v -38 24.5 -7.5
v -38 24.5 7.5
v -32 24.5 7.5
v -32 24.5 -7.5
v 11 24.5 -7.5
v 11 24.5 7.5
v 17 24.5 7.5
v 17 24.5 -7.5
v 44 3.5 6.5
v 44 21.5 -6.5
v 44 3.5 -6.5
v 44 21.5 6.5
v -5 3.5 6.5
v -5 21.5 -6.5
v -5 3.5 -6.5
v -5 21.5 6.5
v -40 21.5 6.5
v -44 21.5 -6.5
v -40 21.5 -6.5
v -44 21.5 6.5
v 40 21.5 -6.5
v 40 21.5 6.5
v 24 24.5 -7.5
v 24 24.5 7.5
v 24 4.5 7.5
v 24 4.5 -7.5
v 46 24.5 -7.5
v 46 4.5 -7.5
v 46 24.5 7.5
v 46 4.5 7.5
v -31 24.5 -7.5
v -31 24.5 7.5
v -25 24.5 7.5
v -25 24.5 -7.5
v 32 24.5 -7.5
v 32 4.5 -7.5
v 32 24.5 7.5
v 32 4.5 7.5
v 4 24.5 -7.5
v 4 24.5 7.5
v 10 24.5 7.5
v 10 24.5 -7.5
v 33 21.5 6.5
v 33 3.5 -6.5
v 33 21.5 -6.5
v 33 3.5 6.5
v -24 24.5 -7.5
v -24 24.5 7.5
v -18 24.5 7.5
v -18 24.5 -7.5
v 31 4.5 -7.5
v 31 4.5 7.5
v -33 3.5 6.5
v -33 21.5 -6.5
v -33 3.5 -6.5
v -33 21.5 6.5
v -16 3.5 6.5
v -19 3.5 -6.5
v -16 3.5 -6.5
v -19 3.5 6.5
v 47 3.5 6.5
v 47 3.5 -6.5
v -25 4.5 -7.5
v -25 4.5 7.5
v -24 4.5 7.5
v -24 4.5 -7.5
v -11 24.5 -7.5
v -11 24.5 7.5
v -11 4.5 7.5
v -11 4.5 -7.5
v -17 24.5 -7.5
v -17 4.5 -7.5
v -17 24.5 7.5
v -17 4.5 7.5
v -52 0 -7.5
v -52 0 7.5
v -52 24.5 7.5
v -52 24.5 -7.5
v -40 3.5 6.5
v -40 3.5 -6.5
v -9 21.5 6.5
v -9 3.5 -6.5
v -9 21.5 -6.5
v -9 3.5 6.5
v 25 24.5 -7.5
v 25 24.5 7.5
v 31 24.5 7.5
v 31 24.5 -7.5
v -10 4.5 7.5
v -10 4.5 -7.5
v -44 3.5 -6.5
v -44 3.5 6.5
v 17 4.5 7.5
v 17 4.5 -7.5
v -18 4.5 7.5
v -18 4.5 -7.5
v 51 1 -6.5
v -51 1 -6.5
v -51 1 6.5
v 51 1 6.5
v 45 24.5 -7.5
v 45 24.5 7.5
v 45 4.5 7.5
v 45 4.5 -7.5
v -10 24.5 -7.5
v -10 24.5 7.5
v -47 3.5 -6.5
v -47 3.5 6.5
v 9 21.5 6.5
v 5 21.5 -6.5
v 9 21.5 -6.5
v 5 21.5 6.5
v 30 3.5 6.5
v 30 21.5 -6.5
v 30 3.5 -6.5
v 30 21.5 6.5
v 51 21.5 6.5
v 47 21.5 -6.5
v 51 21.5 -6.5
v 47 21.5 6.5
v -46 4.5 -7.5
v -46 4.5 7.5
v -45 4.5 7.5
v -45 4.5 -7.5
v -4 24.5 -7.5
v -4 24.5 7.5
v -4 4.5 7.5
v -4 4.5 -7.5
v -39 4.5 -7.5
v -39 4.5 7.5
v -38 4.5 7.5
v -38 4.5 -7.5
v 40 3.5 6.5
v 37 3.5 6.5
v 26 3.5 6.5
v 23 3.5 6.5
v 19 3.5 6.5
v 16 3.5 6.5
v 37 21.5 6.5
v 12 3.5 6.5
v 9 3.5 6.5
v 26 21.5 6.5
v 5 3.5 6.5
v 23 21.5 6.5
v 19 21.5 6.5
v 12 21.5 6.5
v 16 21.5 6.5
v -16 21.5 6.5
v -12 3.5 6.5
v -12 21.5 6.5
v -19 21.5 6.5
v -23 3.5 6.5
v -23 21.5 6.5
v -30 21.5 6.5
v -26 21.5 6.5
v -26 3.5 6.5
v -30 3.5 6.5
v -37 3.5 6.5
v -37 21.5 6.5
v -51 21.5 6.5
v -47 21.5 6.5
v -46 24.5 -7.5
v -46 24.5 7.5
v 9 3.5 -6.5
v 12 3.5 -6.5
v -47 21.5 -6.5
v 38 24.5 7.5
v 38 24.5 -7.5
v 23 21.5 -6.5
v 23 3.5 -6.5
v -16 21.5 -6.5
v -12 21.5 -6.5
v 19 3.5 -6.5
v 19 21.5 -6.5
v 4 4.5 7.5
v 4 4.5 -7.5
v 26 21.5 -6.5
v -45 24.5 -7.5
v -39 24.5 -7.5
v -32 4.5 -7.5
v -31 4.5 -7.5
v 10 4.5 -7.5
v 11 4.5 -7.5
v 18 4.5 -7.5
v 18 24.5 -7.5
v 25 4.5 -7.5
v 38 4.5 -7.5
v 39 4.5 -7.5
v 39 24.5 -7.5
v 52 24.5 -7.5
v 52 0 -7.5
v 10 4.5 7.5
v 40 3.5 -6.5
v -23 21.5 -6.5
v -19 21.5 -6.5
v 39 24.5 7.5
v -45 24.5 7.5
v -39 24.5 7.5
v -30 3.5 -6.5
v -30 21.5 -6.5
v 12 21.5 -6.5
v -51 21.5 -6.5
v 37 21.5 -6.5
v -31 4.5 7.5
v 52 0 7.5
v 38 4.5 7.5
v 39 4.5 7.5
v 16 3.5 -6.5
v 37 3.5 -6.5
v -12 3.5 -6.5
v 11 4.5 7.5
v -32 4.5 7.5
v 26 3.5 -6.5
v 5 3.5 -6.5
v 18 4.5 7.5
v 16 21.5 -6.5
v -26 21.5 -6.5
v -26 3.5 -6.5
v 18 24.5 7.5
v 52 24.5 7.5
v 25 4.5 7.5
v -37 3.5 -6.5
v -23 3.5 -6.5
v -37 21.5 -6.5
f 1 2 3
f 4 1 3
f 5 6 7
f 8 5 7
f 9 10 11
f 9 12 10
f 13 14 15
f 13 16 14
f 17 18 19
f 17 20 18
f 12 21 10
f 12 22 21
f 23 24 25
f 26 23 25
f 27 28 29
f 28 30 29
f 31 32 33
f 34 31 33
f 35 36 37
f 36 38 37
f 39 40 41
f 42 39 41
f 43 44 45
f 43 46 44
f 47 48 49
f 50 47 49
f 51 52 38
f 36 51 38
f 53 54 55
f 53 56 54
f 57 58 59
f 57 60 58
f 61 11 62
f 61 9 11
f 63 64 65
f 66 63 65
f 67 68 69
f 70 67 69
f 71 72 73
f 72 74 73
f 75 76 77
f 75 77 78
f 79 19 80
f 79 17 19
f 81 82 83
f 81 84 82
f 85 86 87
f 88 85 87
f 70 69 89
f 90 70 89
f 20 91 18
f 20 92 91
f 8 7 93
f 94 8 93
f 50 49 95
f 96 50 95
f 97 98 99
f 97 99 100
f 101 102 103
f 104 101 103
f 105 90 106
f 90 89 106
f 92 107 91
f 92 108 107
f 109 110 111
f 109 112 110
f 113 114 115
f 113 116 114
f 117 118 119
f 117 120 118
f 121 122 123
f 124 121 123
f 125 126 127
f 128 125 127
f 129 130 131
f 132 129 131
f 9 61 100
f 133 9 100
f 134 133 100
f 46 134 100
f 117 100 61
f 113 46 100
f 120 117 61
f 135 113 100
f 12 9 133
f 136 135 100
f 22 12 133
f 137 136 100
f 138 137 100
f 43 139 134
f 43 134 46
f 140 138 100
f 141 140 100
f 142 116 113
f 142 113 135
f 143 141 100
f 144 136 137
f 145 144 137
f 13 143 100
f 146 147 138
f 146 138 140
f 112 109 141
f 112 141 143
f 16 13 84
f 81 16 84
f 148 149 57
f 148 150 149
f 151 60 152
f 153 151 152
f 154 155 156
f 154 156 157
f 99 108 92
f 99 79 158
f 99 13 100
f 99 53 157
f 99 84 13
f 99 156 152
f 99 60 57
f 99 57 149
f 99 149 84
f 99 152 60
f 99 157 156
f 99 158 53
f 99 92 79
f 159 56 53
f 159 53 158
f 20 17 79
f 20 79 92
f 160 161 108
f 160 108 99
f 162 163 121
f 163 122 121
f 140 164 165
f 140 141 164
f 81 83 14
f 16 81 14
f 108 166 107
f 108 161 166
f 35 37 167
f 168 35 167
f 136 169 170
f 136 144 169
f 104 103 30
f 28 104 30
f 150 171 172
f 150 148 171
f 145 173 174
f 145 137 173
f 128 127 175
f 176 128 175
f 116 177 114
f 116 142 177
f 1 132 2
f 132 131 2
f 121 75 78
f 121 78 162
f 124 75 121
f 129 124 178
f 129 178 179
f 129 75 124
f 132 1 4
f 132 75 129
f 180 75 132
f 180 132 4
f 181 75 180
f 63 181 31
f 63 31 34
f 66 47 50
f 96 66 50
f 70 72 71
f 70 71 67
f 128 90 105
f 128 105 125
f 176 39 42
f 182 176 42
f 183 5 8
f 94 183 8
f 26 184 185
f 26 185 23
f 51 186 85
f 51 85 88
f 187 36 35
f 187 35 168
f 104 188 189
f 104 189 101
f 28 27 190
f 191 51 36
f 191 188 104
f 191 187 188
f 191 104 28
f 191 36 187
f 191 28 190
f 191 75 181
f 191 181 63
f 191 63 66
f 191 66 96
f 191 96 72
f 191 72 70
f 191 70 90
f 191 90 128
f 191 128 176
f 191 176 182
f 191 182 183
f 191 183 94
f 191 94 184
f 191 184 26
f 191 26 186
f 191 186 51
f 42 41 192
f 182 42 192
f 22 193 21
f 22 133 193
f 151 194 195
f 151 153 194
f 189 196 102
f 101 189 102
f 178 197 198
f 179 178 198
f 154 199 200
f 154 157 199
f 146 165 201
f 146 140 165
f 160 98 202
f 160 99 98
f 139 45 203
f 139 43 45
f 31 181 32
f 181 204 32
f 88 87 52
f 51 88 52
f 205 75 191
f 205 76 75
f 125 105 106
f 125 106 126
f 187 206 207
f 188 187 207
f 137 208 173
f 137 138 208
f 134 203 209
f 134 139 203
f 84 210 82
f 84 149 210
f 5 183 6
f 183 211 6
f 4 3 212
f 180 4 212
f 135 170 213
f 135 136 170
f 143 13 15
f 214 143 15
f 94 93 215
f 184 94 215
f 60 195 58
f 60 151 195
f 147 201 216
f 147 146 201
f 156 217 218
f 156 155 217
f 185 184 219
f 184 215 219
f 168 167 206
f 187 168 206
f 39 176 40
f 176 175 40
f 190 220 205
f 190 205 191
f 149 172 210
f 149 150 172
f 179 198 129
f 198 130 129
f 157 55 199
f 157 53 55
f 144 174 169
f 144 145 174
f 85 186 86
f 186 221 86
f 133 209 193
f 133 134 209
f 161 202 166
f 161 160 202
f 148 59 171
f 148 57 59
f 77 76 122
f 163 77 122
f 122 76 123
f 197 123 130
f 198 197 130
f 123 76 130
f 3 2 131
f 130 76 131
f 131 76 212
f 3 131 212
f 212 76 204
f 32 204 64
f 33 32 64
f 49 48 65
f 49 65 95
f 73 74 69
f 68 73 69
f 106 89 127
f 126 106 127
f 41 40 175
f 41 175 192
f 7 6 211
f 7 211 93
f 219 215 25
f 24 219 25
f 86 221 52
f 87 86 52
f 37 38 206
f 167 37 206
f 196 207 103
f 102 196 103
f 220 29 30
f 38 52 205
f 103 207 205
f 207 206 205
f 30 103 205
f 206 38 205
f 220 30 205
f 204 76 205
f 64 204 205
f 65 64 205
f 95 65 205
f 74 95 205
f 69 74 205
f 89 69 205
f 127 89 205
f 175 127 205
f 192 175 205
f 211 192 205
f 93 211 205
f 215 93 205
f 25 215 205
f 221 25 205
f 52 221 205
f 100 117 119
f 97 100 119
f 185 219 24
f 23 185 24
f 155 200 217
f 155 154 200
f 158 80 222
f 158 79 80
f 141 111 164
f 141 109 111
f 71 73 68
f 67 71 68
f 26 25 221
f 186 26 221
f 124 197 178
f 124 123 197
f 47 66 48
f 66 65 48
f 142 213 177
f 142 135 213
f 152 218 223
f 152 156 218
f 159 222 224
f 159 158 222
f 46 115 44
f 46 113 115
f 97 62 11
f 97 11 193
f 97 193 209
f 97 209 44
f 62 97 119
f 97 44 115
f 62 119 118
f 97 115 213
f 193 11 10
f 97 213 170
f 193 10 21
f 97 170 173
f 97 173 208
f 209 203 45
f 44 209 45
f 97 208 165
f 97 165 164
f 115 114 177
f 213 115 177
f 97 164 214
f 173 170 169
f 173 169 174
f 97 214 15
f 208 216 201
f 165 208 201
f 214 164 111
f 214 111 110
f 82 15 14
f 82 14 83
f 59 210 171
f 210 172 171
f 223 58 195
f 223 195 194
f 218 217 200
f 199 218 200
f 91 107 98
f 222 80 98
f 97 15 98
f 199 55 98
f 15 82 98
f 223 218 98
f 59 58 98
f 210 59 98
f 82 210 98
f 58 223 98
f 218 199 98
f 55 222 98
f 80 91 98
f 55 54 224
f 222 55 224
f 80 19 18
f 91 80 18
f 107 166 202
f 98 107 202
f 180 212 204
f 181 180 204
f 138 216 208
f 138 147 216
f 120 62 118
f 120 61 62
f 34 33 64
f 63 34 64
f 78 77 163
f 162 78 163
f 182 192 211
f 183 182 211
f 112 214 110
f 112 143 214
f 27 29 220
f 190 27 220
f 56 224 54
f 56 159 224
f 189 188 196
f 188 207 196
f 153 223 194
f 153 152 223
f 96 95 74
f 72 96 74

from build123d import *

# Parameters (mm, degrees)
BOSS_EXTRUDE1_DEPTH     = 7.5
LPATTERN1_COUNT         = 8
LPATTERN1_PITCH         = 7
LPATTERN1_COL_COUNT     = 8
LPATTERN1_COL_PITCH     = 7
SHELL2_T                = -1
CUT_EXTRUDE2_DEPTH      = 15
CUT_EXTRUDE2_DEPTH_BACK = 58.608593109
SKETCH3_W               = 0.5
SKETCH3_H               = 4.5
SKETCH4_W               = 13
SKETCH4_H               = 2.5
BOSS_EXTRUDE2_DEPTH     = 1
SKETCH5_W               = 13
SKETCH5_H               = 2.5
BOSS_EXTRUDE3_DEPTH     = 1
SKETCH8_W               = 6
SKETCH8_H               = 15
BOSS_EXTRUDE5_DEPTH     = 2
LPATTERN2_COUNT         = 15
LPATTERN2_PITCH         = 7
SKETCH10_W              = 6
SKETCH10_H              = 15
CUT_EXTRUDE4_DEPTH      = 20
SKETCH11_W              = 13
SKETCH11_H              = 1
BOSS_EXTRUDE6_DEPTH     = 4


# Read off the part's stored shape, not the designer's step: Split1
with BuildPart() as part:
    # Sketch1 → Boss-Extrude1 (new, symmetric)
    with BuildSketch(Plane.XY):
        Polygon((0, 0), (-3.5, 0), (-3.5, 4.5), (-3, 4.5), (-3, 22.5), (3, 22.5), (3, 4.5), (3.5, 4.5), (3.5, 0), align=None)
    boss_extrude1 = extrude(amount=BOSS_EXTRUDE1_DEPTH, both=True)

    # LPattern1: Boss-Extrude1 ×8
    with Locations(*[(-i * LPATTERN1_PITCH, 0, 0) for i in range(1, LPATTERN1_COUNT)]):
        add(boss_extrude1)


with BuildPart() as lpattern1_col_1:
    # LPattern1 col: pattern copy
    add(boss_extrude1.moved(Location(Vector(1, 0, 0) * (1 * LPATTERN1_COL_PITCH))))


with BuildPart() as lpattern1_col_2:
    # LPattern1 col: pattern copy
    add(boss_extrude1.moved(Location(Vector(1, 0, 0) * (2 * LPATTERN1_COL_PITCH))))


with BuildPart() as lpattern1_col_3:
    # LPattern1 col: pattern copy
    add(boss_extrude1.moved(Location(Vector(1, 0, 0) * (3 * LPATTERN1_COL_PITCH))))


with BuildPart() as lpattern1_col_4:
    # LPattern1 col: pattern copy
    add(boss_extrude1.moved(Location(Vector(1, 0, 0) * (4 * LPATTERN1_COL_PITCH))))


with BuildPart() as lpattern1_col_5:
    # LPattern1 col: pattern copy
    add(boss_extrude1.moved(Location(Vector(1, 0, 0) * (5 * LPATTERN1_COL_PITCH))))


with BuildPart() as lpattern1_col_6:
    # LPattern1 col: pattern copy
    add(boss_extrude1.moved(Location(Vector(1, 0, 0) * (6 * LPATTERN1_COL_PITCH))))


with BuildPart() as lpattern1_col_7:
    # LPattern1 col: pattern copy
    add(boss_extrude1.moved(Location(Vector(1, 0, 0) * (7 * LPATTERN1_COL_PITCH))))


with BuildPart() as part_1:
    add(part.part)

    # LPattern1 col united with what the copie: union LPattern1 col_1, LPattern1 col_2, LPattern1 col_3, LPattern1 col_4, LPattern1 col_5, LPattern1 col_6, LPattern1 col_7
    add(lpattern1_col_1.part)
    add(lpattern1_col_2.part)
    add(lpattern1_col_3.part)
    add(lpattern1_col_4.part)
    add(lpattern1_col_5.part)
    add(lpattern1_col_6.part)
    add(lpattern1_col_7.part)

    # Shell2
    shell2_openings = [part_1.faces().sort_by_distance(p)[0] for p in [
        (52.5, 2.25, 0),
        (-52.5, 2.25, 0),
    ]]
    offset(amount=SHELL2_T, openings=shell2_openings, kind=Kind.INTERSECTION)

    # Sketch3 → Cut-Extrude2 (cut, two sides: drawn at the far end of the back side and taken through both)
    with BuildSketch(Plane.XY.offset(-CUT_EXTRUDE2_DEPTH_BACK)):
        with Locations((-52.25, 2.25)):
            Rectangle(SKETCH3_W, SKETCH3_H)
        with Locations((52.25, 2.25)):
            Rectangle(SKETCH3_W, SKETCH3_H)
    extrude(amount=CUT_EXTRUDE2_DEPTH + CUT_EXTRUDE2_DEPTH_BACK, mode=Mode.SUBTRACT)

    # Sketch4 → Boss-Extrude2 (add)
    with BuildSketch(Plane.ZY.offset(52)):
        with Locations((0, 2.25)):
            Rectangle(SKETCH4_W, SKETCH4_H)
    extrude(amount=-BOSS_EXTRUDE2_DEPTH)

    # Sketch5 → Boss-Extrude3 (add)
    with BuildSketch(Plane(origin=(52, 0, 0), x_dir=(0, 0, -1), z_dir=(1, 0, 0))):
        with Locations((0, 2.25)):
            Rectangle(SKETCH5_W, SKETCH5_H)
    extrude(amount=-BOSS_EXTRUDE3_DEPTH)

    # Sketch8 → Boss-Extrude5 (add)
    with BuildSketch(Plane(origin=(0, 22.5, 0), x_dir=(1, 0, 0), z_dir=(0, 1, 0))):
        with Locations((-49, 0)):
            Rectangle(SKETCH8_W, SKETCH8_H)
    boss_extrude5 = extrude(amount=BOSS_EXTRUDE5_DEPTH)

    # LPattern2: Boss-Extrude5 ×15
    with Locations(*[(i * LPATTERN2_PITCH, 0, 0) for i in range(1, LPATTERN2_COUNT)]):
        add(boss_extrude5)


with BuildPart() as body_2:
    # Split1: the piece on the far side of the plane
    add(part_1.part)
    split(bisect_by=Plane(origin=(0, 1, 0), x_dir=(1, 0, 0), z_dir=(0, 1, 0)), keep=Keep.BOTTOM)


with BuildPart() as part_2:
    add(part_1.part)

    # Split1
    split(bisect_by=Plane(origin=(0, 1, 0), x_dir=(1, 0, 0), z_dir=(0, 1, 0)), keep=Keep.TOP)

    # Sketch10 → Cut-Extrude4 (cut)
    with BuildSketch(Plane(origin=(0, 24.5, 0), x_dir=(1, 0, 0), z_dir=(0, 1, 0))):
        Rectangle(SKETCH10_W, SKETCH10_H)
    extrude(amount=-CUT_EXTRUDE4_DEPTH, mode=Mode.SUBTRACT)

    # Sketch11 → Boss-Extrude6 (add)
    with BuildSketch(Plane(origin=(-2, 0, 0), x_dir=(0, 0, -1), z_dir=(1, 0, 0))):
        with Locations((0, 4)):
            Rectangle(SKETCH11_W, SKETCH11_H)
    extrude(amount=BOSS_EXTRUDE6_DEPTH)


with BuildPart() as body_2_1:
    add(body_2.part)

    # Combine1: union part
    add(part_2.part)


solid = body_2_1.part
